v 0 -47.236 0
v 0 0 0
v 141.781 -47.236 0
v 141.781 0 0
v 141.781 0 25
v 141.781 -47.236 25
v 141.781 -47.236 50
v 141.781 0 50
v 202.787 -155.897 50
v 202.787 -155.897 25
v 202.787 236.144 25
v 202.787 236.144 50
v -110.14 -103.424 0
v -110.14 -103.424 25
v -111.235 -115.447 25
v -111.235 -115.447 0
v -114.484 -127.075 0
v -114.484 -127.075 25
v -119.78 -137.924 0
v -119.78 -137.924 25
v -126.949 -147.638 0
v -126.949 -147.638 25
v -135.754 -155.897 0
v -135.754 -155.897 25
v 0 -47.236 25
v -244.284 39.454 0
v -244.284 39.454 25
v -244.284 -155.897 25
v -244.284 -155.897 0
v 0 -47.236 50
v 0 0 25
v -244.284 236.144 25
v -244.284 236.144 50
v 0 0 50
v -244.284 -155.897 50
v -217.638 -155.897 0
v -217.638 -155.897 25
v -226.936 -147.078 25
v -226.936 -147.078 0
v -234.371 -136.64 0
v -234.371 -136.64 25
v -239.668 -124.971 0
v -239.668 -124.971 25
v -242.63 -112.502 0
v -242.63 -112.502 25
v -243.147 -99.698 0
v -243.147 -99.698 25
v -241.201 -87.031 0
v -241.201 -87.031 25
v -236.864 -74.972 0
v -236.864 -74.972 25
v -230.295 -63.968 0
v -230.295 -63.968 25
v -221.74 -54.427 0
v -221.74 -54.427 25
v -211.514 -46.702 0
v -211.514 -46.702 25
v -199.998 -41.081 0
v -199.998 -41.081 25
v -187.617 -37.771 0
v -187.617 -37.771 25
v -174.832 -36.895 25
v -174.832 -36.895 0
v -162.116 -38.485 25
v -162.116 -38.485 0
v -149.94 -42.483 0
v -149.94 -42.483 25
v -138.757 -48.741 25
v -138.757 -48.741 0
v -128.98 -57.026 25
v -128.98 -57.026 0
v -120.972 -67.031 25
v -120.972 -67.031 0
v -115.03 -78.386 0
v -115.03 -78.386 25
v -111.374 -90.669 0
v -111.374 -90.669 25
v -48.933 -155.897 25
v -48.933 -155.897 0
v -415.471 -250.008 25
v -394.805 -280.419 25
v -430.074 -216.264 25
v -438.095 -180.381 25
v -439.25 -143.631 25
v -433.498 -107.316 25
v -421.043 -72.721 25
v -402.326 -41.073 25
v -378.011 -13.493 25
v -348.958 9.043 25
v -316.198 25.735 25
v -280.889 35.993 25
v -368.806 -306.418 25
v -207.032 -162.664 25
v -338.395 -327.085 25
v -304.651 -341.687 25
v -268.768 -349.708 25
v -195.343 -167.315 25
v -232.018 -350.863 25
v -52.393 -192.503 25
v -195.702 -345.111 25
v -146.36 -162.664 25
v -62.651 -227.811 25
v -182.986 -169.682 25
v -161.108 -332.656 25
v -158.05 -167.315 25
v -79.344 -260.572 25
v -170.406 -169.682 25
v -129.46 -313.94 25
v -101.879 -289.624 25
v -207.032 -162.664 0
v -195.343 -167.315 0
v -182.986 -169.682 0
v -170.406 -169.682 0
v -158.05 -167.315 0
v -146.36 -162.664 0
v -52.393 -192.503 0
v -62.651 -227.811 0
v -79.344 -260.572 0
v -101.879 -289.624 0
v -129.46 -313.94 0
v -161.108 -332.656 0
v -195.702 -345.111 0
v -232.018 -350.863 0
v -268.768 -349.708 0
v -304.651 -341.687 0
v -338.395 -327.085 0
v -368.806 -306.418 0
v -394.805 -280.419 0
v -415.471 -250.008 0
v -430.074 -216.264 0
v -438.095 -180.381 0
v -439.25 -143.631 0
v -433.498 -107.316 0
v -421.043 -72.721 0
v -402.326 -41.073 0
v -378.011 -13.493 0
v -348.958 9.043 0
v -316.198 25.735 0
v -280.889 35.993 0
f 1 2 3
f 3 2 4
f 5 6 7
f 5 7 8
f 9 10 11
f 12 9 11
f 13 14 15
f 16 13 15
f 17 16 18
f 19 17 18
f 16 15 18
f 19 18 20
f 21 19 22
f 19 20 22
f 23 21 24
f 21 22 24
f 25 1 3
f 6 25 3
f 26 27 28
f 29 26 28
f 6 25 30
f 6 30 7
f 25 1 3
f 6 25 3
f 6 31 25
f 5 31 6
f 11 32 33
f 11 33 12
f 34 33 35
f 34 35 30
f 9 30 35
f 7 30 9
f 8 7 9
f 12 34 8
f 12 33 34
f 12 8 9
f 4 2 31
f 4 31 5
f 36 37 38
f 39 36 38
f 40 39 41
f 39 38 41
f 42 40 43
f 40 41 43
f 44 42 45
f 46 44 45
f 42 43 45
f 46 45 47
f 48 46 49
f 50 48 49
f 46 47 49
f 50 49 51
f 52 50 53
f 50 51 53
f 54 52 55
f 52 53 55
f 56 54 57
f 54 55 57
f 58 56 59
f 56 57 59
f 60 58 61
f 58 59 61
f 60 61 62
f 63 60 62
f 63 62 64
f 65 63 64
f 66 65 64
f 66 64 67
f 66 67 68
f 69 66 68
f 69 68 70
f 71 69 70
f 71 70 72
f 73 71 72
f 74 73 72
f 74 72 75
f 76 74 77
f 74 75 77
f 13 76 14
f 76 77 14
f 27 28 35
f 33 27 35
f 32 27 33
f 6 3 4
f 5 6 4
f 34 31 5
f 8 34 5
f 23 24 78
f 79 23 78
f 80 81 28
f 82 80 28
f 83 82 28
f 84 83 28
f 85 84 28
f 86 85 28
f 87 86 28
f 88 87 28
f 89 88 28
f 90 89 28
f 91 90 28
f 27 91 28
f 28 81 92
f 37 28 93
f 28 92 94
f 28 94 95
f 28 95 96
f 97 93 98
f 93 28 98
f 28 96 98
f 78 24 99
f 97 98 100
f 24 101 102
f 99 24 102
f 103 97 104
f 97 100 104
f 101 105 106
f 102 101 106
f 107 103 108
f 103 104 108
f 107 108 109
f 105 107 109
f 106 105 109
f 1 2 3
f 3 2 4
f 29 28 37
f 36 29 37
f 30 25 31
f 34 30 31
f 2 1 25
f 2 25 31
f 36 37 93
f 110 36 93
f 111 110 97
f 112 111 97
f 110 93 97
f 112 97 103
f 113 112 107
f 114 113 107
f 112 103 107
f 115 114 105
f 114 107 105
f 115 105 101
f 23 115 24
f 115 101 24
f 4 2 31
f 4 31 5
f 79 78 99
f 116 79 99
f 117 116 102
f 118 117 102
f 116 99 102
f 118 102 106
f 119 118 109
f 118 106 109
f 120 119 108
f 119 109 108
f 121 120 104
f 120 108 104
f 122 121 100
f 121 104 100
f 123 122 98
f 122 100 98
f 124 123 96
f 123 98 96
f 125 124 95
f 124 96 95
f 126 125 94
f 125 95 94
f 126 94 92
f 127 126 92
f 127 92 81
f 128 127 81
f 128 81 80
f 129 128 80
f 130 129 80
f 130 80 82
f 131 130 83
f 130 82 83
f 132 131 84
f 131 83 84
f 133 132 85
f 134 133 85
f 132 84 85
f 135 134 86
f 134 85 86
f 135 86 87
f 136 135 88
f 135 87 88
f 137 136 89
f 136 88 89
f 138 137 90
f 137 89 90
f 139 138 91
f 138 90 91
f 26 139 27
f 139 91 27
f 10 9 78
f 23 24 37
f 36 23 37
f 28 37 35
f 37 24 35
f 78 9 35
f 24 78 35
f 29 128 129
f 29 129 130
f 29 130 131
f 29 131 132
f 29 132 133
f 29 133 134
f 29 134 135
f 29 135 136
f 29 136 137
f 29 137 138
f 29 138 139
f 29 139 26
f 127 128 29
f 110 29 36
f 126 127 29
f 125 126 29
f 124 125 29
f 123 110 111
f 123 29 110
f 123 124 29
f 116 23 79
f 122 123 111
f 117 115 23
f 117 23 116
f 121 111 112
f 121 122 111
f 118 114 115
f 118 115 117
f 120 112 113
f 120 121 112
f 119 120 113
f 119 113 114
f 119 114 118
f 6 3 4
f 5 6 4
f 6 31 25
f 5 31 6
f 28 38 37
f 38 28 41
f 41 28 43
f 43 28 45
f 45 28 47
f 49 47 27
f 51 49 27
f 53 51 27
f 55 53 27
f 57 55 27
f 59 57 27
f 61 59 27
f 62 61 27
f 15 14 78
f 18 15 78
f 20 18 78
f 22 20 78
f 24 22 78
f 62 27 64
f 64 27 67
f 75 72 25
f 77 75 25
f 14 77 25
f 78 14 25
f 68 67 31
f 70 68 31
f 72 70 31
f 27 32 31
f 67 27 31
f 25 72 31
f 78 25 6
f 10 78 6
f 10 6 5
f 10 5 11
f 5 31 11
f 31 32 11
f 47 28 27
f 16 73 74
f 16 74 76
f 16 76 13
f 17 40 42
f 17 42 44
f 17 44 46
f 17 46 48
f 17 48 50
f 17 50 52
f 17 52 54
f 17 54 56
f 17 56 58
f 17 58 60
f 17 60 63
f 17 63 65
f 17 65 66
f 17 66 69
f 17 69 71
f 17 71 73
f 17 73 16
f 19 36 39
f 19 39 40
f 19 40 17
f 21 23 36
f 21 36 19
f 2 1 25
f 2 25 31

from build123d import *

# Parameters (mm, degrees)
F0_W     = 141.781181097
F0_H     = 47.2364425659
F2_DEPTH = 25
F1_W     = 141.781181097
F1_H     = 47.2364425659
F3_DEPTH = 25
F4_W     = 447.0715709031
F4_H     = 392.0415639877
F4_W_2   = 141.781181097
F4_H_2   = 47.2364425659
F5_DEPTH = 25
F6_R     = 58.2053766927
F7_DEPTH = 25


with BuildPart() as f2:
    # F0 (on Top) → F2 (new body)
    with BuildSketch(Plane.XY):
        with Locations((70.8905905485, -23.618221283)):
            Rectangle(F0_W, F0_H)
    extrude(amount=F2_DEPTH)


with BuildPart() as f3:
    # F1 (on face) → F3 (new body)
    with BuildSketch(Plane.XY):
        with Locations((70.8905905485, -23.618221283)):
            Rectangle(F1_W, F1_H)
    extrude(amount=F3_DEPTH)


with BuildPart() as f5:
    # F4 (on face) → F5 (new body)
    with BuildSketch(Plane.XY.offset(25)):
        with Locations((-20.7483563572, 40.1233434677)):
            Rectangle(F4_W, F4_H)
        with Locations((70.8905905485, -23.618221283)):
            Rectangle(F4_W_2, F4_H_2, mode=Mode.SUBTRACT)
    extrude(amount=F5_DEPTH)

    # F6 (on face) → F7 (join)
    with BuildSketch(Plane(origin=(0, 0, 25), x_dir=(1, 0, 0), z_dir=(0, 0, -1))):
        with BuildLine():
            Line((-135.7540871434, 155.8974385262), (-48.9331977702, 155.8974385262))
            ThreePointArc((-48.9331977702, 155.8974385262), (-382.4181190496, 294.031415767), (-244.2841418087, -39.4535055124))
            Line((-244.2841418087, -39.4535055124), (-244.2841418087, 155.8974385262))
            Line((-244.2841418087, 155.8974385262), (-217.6381264396, 155.8974385262))
            ThreePointArc((-217.6381264396, 155.8974385262), (-176.6961067915, 169.9801472237), (-135.7540871434, 155.8974385262))
        make_face()
        with Locations((-324.4167268276, 163.0218029022)):
            Circle(F6_R, mode=Mode.SUBTRACT)
        with BuildLine():
            ThreePointArc((-110.1403149555, 103.4243553877), (-116.8855643932, 132.6197736059), (-135.7540871434, 155.8974385262))
            Line((-135.7540871434, 155.8974385262), (-217.6381264396, 155.8974385262))
            ThreePointArc((-217.6381264396, 155.8974385262), (-205.8915250097, 43.6138129894), (-110.1403149555, 103.4243553877))
        make_face()
        with Locations((-324.4167268276, 163.0218029022)):
            Circle(F6_R)
    extrude(amount=F7_DEPTH)


solid = Compound([f2.part, f3.part, f5.part])
